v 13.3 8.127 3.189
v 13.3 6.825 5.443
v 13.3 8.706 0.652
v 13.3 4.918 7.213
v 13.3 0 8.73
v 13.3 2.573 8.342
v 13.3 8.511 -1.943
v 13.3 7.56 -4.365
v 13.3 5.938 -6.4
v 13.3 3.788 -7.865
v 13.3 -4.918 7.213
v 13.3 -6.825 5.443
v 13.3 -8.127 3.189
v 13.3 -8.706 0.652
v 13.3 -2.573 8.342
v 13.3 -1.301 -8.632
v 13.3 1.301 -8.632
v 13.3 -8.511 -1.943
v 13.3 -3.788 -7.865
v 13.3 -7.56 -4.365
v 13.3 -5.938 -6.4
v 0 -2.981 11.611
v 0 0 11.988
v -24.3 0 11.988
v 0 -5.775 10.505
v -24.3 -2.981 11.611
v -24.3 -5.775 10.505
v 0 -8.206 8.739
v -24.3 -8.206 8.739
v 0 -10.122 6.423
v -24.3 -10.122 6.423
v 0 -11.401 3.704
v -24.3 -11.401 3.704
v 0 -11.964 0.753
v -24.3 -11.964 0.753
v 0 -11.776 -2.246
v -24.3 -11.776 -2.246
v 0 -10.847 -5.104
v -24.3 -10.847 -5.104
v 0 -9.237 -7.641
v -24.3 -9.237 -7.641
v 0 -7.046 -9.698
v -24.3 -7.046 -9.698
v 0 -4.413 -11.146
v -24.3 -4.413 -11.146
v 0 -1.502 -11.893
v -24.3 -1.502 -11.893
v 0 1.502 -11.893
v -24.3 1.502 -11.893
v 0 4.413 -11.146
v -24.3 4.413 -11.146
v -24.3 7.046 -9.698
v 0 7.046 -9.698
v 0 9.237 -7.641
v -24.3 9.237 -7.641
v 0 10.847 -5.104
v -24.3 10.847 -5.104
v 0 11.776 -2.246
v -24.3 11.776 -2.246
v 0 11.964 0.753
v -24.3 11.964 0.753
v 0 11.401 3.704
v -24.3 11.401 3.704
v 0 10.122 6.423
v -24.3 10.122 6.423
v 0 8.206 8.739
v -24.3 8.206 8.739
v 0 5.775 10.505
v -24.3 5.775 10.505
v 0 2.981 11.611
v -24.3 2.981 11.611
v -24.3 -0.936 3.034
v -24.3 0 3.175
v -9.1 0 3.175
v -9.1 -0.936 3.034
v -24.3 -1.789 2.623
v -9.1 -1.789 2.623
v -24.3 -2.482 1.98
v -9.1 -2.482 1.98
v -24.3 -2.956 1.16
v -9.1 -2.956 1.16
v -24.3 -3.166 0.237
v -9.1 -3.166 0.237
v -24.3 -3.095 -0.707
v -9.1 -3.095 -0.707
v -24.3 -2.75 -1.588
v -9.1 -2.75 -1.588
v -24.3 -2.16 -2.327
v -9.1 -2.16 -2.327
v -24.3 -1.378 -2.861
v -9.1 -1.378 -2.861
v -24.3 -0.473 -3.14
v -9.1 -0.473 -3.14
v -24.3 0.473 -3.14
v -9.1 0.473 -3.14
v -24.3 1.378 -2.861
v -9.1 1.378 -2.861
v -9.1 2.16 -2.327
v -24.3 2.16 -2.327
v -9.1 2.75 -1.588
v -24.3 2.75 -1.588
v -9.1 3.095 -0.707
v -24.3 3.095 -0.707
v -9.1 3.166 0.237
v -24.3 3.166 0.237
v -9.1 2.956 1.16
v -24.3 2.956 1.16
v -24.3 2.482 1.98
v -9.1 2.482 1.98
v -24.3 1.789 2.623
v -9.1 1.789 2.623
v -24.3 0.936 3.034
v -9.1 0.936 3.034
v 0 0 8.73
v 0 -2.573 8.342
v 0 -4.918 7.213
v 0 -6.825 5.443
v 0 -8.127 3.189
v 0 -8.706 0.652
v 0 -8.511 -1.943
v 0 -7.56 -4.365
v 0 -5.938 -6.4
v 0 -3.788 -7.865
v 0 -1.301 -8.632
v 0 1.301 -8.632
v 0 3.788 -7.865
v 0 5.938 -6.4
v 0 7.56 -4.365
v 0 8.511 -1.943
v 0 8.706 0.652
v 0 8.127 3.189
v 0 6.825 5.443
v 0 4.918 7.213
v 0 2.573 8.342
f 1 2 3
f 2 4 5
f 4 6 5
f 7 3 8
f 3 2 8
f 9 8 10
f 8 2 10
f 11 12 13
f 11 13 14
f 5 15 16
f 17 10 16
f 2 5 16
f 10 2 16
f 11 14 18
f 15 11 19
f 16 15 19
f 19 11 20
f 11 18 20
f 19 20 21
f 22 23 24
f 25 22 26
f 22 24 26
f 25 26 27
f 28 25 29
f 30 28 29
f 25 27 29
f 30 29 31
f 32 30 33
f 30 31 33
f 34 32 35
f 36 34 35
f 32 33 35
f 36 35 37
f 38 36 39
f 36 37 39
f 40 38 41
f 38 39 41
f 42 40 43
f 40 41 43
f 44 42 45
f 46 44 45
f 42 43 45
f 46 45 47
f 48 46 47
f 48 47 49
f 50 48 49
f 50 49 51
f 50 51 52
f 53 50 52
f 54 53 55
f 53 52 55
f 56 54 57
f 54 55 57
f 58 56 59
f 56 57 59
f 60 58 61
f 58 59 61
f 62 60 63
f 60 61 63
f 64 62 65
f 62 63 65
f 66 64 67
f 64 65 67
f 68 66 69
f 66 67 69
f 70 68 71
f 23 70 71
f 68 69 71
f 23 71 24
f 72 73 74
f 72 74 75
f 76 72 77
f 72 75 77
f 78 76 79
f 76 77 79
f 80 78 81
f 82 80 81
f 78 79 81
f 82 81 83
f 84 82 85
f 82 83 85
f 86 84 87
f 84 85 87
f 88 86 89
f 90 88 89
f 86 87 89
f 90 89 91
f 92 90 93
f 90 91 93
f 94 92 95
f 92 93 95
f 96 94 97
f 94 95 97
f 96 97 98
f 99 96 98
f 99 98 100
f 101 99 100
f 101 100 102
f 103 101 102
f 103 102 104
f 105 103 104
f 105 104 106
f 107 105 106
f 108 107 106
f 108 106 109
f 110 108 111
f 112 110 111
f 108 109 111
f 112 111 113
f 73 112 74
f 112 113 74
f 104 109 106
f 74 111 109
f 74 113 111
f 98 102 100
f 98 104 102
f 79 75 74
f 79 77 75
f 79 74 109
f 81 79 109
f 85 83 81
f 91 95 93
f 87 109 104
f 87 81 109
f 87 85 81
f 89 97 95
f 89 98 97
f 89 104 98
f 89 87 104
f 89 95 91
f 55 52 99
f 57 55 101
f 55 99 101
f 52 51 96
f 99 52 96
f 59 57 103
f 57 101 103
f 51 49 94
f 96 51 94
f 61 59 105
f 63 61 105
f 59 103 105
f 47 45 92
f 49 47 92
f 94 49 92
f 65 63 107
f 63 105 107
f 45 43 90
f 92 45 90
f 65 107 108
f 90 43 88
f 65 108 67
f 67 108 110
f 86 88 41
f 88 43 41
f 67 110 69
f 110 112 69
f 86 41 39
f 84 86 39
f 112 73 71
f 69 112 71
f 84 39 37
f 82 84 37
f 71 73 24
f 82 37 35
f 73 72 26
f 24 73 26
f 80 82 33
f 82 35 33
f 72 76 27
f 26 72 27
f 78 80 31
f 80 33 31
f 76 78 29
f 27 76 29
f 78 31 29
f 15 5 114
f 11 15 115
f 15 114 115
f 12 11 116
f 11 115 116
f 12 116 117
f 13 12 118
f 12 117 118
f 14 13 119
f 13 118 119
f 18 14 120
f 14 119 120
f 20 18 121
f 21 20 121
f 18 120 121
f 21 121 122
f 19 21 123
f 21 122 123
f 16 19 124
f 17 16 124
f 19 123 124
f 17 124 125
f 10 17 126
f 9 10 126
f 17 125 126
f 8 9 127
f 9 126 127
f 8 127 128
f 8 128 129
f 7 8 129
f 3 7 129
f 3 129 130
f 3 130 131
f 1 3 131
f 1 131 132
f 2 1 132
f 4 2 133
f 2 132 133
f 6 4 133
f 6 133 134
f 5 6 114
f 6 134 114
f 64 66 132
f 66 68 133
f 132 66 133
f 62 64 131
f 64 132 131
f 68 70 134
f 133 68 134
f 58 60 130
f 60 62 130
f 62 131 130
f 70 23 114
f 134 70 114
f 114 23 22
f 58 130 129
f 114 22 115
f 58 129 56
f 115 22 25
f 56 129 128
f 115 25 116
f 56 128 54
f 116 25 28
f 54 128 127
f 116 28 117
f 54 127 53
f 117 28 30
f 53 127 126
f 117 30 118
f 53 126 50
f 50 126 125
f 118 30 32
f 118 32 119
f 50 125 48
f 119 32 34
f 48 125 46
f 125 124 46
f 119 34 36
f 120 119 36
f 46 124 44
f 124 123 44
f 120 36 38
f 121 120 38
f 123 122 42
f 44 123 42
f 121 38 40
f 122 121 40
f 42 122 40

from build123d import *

# Parameters (mm, degrees)
SOCKET_SKETCH_W = 16.2
SOCKET_SKETCH_H = 3.175


with BuildPart() as part:
    # Conn_T4_ORB8 Sketch → Conn_T4_ORB8 (revolve)
    with BuildSketch(Plane.XY):
        Polygon((13.3, 0), (13.3, 8.73), (0, 8.73), (0, 11.988), (-24.3, 11.988), (-24.3, 0), align=None)
    revolve(axis=Axis((-1000, 0, 0), (1, 0, 0)))

    # Socket Sketch → Socket (revolve, cut)
    with BuildSketch(Plane.XY):
        with Locations((-17.2, 1.5875)):
            Rectangle(SOCKET_SKETCH_W, SOCKET_SKETCH_H)
    revolve(axis=Axis((-1000, 0, 0), (1, 0, 0)), mode=Mode.SUBTRACT)


solid = part.part
